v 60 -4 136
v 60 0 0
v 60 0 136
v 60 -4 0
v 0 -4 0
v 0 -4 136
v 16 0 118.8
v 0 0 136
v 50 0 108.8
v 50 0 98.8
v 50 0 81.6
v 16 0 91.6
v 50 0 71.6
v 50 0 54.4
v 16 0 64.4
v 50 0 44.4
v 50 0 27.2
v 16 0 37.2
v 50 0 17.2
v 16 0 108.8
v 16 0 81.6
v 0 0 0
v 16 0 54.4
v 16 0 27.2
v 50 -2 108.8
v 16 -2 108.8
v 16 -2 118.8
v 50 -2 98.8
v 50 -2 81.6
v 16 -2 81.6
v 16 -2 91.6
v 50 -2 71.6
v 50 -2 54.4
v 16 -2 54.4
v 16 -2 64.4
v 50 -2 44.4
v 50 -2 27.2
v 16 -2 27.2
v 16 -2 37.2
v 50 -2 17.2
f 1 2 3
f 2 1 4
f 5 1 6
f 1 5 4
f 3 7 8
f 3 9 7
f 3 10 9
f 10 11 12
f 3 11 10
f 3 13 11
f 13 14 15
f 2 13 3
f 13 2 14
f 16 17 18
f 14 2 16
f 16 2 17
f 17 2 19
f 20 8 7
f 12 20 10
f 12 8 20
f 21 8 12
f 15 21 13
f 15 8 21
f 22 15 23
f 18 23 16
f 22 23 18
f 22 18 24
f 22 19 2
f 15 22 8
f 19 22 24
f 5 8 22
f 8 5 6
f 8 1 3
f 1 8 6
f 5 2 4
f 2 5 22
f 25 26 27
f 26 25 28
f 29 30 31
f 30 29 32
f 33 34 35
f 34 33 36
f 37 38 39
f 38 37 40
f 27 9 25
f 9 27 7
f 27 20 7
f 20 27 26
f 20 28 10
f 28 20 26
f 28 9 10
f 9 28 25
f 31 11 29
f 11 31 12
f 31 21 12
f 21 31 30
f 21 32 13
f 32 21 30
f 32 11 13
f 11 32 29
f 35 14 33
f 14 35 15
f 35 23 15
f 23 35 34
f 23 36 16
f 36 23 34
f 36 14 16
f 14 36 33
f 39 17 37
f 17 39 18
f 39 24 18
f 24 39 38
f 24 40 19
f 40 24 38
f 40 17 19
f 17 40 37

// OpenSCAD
// file: vars.scad
height = 136; // measured
sidew = 60; // 30 on, 30 off
sidet = 4;
depth = 40;
latchh = 4;
backt = 4;
risergap = 8; // space occupied by drive mounts
riserspace = 2; // space occupied by drive cage
riserdepth = 4; // how far riser descends
// main file
include <vars.scad>

// side face, with indentations for labeling drives
rotate([90, 0, 0]){
  difference(){
    cube([sidew, height, sidet]);
    union(){
      linear_extrude(2){
        for(ul = [1 : 4]){
          polygon([[16, height - ul * height / 5 + 10],
                   [sidew - 10, height - ul * height / 5],
                   [sidew - 10, height - ul * height / 5 - 10],
                   [16, height - ul * height / 5]]);
        }
      }
    }
  }
}
